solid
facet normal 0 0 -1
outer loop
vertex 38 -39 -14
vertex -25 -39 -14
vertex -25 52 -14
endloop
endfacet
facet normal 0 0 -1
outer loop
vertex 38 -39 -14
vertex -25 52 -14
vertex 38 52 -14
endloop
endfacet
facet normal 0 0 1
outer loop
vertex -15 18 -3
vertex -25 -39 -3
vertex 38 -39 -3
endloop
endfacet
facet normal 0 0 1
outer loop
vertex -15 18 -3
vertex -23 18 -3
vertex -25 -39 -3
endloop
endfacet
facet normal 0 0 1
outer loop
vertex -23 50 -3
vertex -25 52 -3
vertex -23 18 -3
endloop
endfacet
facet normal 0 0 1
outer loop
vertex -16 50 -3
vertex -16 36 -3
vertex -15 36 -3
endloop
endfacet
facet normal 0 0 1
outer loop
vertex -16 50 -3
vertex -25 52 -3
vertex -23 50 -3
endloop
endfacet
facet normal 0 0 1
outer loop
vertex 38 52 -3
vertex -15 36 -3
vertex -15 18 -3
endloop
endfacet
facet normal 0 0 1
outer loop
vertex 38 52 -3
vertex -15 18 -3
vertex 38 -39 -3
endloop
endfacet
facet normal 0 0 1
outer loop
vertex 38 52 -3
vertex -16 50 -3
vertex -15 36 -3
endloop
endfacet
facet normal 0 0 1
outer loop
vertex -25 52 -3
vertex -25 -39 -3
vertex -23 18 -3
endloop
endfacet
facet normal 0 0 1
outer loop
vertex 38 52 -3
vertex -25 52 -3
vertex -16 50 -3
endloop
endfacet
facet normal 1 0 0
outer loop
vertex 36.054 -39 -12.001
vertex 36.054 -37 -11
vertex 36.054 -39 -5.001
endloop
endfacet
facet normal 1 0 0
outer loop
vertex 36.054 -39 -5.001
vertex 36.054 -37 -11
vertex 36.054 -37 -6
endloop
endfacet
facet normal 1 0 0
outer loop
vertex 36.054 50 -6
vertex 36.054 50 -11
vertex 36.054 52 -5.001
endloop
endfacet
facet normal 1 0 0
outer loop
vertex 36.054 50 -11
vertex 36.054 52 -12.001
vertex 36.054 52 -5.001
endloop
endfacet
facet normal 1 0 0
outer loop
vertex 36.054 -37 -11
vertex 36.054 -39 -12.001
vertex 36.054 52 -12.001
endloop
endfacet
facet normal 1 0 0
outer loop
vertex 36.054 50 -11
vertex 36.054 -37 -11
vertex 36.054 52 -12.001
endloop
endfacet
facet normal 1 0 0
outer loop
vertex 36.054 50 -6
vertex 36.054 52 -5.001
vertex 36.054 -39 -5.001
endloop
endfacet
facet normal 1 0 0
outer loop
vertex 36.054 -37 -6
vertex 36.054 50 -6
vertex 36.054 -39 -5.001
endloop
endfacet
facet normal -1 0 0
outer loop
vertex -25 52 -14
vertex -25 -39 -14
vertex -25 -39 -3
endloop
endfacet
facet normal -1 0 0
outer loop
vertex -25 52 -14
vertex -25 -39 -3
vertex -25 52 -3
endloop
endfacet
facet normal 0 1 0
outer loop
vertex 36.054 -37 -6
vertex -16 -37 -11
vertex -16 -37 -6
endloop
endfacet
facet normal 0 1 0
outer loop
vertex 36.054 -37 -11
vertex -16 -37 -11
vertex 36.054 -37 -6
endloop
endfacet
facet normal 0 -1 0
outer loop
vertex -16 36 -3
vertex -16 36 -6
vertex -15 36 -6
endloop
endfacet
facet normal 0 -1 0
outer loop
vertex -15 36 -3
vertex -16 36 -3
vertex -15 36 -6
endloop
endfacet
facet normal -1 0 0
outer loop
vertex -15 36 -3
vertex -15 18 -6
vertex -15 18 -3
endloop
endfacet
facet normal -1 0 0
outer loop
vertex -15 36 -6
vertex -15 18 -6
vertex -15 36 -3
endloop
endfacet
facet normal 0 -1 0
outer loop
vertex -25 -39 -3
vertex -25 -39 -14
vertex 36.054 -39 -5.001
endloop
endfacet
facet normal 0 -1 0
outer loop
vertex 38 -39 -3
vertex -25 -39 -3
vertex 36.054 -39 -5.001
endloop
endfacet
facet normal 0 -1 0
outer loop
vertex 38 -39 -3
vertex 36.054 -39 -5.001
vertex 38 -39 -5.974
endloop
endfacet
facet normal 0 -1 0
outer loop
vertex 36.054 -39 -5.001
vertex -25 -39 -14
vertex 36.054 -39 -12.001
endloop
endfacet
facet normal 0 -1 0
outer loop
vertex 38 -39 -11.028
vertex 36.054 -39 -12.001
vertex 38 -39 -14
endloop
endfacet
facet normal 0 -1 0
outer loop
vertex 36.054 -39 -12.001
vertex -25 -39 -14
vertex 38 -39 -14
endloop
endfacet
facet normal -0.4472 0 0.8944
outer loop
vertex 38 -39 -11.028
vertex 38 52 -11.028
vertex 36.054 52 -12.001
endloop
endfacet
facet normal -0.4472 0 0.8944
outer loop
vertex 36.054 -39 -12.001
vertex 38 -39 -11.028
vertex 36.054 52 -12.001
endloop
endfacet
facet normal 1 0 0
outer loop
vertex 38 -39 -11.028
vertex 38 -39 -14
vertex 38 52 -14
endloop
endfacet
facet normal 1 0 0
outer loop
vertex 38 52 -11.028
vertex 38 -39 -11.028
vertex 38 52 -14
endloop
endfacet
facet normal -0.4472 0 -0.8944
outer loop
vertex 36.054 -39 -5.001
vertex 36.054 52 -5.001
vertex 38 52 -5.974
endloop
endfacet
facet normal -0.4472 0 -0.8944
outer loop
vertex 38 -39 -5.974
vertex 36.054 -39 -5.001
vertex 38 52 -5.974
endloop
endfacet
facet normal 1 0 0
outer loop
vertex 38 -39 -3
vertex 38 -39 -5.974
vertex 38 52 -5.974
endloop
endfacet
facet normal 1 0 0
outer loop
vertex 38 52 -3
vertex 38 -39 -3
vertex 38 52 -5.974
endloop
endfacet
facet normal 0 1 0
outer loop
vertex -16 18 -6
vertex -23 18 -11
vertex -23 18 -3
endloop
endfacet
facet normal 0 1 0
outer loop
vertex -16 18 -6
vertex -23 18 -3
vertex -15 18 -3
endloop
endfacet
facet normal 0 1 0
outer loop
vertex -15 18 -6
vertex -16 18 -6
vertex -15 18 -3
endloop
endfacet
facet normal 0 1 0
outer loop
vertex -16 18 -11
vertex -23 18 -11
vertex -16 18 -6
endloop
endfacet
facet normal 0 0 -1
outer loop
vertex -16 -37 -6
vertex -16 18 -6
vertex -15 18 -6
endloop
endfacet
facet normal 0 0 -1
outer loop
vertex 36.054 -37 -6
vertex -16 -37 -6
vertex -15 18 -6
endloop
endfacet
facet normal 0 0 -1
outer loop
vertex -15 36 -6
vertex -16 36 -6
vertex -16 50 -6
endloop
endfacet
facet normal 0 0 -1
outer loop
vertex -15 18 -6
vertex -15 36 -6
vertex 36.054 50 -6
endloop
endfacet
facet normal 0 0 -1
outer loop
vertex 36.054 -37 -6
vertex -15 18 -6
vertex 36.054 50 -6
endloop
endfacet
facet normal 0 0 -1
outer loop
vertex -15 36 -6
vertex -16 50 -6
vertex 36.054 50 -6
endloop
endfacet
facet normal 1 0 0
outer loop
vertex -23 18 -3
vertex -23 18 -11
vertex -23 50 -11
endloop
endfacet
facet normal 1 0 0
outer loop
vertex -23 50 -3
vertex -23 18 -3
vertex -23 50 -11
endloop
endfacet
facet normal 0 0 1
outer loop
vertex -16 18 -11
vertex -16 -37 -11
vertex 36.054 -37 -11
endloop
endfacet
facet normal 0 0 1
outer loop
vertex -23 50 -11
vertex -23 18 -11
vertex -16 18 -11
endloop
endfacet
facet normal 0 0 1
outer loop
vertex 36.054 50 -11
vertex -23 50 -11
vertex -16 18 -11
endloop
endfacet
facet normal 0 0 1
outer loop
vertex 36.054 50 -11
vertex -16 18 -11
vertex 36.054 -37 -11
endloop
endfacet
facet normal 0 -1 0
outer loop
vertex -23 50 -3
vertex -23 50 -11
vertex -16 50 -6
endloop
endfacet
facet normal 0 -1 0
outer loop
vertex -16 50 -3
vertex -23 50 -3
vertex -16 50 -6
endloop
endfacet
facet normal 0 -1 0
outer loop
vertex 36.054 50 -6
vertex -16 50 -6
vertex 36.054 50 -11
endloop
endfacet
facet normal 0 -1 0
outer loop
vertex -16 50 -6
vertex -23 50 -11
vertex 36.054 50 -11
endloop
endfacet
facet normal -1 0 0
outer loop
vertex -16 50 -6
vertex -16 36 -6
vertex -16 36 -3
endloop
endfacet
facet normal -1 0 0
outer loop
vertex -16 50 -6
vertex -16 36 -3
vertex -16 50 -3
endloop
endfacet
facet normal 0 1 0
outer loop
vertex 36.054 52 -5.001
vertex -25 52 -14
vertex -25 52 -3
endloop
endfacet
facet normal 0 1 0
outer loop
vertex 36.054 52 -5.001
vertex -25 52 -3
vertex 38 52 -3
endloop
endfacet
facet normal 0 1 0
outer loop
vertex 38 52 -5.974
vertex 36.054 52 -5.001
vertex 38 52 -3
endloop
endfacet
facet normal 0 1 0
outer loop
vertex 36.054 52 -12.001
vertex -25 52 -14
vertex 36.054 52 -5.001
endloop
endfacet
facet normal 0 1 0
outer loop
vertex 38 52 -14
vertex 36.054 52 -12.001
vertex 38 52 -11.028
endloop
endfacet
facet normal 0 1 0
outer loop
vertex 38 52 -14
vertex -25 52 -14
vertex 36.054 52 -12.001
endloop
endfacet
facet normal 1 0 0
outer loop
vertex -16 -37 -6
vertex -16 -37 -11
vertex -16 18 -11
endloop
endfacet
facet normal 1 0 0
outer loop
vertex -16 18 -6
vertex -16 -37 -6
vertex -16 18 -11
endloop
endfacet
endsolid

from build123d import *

# Parameters (mm, degrees)
BOX023_W     = 8
BOX023_H     = 18
BOX023_DEPTH = 9
BOX022_W     = 7
BOX022_H     = 14
BOX022_DEPTH = 8
PAD001_DEPTH = 91
BOX001_W     = 54
BOX001_H     = 87
BOX001_DEPTH = 5
BOX004_W     = 63
BOX004_H     = 91
BOX004_DEPTH = 11


with BuildPart() as cube021:
    # Box023 → Box023 (new body)
    with BuildSketch(Plane(origin=(-23, 18, -11), x_dir=(1, 0, 0), z_dir=(0, 0, 1))):
        with Locations((4, 9)):
            Rectangle(BOX023_W, BOX023_H)
    extrude(amount=BOX023_DEPTH)


with BuildPart() as batterycablehole:
    # Box022 → Box022 (new body)
    with BuildSketch(Plane(origin=(-23, 36, -11), x_dir=(1, 0, 0), z_dir=(0, 0, 1))):
        with Locations((3.5, 7)):
            Rectangle(BOX022_W, BOX022_H)
    extrude(amount=BOX022_DEPTH)

    # Fusion008: union Cube021
    add(cube021.part)


with BuildPart() as batterysliderhole:
    # Sketch001 → Pad001 (new body)
    with BuildSketch(Plane(origin=(46.6, 52, -18.45), x_dir=(-1, 0, 0), z_dir=(0, -1, 0))):
        Polygon((10.546235, -6.448812), (10.546235, -13.448812), (8.546235, -12.448812), (8.546235, -7.448812), align=None)
    extrude(amount=PAD001_DEPTH)


with BuildPart() as batteryhole:
    # Box001 → Box001 (new body)
    with BuildSketch(Plane(origin=(-16, -37, -11), x_dir=(1, 0, 0), z_dir=(0, 0, 1))):
        with Locations((27, 43.5)):
            Rectangle(BOX001_W, BOX001_H)
    extrude(amount=BOX001_DEPTH)


with BuildPart() as cut013:
    # Box004 → Box004 (new body)
    with BuildSketch(Plane(origin=(-25, -39, -14), x_dir=(1, 0, 0), z_dir=(0, 0, 1))):
        with Locations((31.5, 45.5)):
            Rectangle(BOX004_W, BOX004_H)
    extrude(amount=BOX004_DEPTH)

    # Cut004: cut batteryHole
    add(batteryhole.part, mode=Mode.SUBTRACT)

    # Cut012: cut batterySliderHole
    add(batterysliderhole.part, mode=Mode.SUBTRACT)

    # Cut013: cut batteryCableHole
    add(batterycablehole.part, mode=Mode.SUBTRACT)


solid = cut013.part
